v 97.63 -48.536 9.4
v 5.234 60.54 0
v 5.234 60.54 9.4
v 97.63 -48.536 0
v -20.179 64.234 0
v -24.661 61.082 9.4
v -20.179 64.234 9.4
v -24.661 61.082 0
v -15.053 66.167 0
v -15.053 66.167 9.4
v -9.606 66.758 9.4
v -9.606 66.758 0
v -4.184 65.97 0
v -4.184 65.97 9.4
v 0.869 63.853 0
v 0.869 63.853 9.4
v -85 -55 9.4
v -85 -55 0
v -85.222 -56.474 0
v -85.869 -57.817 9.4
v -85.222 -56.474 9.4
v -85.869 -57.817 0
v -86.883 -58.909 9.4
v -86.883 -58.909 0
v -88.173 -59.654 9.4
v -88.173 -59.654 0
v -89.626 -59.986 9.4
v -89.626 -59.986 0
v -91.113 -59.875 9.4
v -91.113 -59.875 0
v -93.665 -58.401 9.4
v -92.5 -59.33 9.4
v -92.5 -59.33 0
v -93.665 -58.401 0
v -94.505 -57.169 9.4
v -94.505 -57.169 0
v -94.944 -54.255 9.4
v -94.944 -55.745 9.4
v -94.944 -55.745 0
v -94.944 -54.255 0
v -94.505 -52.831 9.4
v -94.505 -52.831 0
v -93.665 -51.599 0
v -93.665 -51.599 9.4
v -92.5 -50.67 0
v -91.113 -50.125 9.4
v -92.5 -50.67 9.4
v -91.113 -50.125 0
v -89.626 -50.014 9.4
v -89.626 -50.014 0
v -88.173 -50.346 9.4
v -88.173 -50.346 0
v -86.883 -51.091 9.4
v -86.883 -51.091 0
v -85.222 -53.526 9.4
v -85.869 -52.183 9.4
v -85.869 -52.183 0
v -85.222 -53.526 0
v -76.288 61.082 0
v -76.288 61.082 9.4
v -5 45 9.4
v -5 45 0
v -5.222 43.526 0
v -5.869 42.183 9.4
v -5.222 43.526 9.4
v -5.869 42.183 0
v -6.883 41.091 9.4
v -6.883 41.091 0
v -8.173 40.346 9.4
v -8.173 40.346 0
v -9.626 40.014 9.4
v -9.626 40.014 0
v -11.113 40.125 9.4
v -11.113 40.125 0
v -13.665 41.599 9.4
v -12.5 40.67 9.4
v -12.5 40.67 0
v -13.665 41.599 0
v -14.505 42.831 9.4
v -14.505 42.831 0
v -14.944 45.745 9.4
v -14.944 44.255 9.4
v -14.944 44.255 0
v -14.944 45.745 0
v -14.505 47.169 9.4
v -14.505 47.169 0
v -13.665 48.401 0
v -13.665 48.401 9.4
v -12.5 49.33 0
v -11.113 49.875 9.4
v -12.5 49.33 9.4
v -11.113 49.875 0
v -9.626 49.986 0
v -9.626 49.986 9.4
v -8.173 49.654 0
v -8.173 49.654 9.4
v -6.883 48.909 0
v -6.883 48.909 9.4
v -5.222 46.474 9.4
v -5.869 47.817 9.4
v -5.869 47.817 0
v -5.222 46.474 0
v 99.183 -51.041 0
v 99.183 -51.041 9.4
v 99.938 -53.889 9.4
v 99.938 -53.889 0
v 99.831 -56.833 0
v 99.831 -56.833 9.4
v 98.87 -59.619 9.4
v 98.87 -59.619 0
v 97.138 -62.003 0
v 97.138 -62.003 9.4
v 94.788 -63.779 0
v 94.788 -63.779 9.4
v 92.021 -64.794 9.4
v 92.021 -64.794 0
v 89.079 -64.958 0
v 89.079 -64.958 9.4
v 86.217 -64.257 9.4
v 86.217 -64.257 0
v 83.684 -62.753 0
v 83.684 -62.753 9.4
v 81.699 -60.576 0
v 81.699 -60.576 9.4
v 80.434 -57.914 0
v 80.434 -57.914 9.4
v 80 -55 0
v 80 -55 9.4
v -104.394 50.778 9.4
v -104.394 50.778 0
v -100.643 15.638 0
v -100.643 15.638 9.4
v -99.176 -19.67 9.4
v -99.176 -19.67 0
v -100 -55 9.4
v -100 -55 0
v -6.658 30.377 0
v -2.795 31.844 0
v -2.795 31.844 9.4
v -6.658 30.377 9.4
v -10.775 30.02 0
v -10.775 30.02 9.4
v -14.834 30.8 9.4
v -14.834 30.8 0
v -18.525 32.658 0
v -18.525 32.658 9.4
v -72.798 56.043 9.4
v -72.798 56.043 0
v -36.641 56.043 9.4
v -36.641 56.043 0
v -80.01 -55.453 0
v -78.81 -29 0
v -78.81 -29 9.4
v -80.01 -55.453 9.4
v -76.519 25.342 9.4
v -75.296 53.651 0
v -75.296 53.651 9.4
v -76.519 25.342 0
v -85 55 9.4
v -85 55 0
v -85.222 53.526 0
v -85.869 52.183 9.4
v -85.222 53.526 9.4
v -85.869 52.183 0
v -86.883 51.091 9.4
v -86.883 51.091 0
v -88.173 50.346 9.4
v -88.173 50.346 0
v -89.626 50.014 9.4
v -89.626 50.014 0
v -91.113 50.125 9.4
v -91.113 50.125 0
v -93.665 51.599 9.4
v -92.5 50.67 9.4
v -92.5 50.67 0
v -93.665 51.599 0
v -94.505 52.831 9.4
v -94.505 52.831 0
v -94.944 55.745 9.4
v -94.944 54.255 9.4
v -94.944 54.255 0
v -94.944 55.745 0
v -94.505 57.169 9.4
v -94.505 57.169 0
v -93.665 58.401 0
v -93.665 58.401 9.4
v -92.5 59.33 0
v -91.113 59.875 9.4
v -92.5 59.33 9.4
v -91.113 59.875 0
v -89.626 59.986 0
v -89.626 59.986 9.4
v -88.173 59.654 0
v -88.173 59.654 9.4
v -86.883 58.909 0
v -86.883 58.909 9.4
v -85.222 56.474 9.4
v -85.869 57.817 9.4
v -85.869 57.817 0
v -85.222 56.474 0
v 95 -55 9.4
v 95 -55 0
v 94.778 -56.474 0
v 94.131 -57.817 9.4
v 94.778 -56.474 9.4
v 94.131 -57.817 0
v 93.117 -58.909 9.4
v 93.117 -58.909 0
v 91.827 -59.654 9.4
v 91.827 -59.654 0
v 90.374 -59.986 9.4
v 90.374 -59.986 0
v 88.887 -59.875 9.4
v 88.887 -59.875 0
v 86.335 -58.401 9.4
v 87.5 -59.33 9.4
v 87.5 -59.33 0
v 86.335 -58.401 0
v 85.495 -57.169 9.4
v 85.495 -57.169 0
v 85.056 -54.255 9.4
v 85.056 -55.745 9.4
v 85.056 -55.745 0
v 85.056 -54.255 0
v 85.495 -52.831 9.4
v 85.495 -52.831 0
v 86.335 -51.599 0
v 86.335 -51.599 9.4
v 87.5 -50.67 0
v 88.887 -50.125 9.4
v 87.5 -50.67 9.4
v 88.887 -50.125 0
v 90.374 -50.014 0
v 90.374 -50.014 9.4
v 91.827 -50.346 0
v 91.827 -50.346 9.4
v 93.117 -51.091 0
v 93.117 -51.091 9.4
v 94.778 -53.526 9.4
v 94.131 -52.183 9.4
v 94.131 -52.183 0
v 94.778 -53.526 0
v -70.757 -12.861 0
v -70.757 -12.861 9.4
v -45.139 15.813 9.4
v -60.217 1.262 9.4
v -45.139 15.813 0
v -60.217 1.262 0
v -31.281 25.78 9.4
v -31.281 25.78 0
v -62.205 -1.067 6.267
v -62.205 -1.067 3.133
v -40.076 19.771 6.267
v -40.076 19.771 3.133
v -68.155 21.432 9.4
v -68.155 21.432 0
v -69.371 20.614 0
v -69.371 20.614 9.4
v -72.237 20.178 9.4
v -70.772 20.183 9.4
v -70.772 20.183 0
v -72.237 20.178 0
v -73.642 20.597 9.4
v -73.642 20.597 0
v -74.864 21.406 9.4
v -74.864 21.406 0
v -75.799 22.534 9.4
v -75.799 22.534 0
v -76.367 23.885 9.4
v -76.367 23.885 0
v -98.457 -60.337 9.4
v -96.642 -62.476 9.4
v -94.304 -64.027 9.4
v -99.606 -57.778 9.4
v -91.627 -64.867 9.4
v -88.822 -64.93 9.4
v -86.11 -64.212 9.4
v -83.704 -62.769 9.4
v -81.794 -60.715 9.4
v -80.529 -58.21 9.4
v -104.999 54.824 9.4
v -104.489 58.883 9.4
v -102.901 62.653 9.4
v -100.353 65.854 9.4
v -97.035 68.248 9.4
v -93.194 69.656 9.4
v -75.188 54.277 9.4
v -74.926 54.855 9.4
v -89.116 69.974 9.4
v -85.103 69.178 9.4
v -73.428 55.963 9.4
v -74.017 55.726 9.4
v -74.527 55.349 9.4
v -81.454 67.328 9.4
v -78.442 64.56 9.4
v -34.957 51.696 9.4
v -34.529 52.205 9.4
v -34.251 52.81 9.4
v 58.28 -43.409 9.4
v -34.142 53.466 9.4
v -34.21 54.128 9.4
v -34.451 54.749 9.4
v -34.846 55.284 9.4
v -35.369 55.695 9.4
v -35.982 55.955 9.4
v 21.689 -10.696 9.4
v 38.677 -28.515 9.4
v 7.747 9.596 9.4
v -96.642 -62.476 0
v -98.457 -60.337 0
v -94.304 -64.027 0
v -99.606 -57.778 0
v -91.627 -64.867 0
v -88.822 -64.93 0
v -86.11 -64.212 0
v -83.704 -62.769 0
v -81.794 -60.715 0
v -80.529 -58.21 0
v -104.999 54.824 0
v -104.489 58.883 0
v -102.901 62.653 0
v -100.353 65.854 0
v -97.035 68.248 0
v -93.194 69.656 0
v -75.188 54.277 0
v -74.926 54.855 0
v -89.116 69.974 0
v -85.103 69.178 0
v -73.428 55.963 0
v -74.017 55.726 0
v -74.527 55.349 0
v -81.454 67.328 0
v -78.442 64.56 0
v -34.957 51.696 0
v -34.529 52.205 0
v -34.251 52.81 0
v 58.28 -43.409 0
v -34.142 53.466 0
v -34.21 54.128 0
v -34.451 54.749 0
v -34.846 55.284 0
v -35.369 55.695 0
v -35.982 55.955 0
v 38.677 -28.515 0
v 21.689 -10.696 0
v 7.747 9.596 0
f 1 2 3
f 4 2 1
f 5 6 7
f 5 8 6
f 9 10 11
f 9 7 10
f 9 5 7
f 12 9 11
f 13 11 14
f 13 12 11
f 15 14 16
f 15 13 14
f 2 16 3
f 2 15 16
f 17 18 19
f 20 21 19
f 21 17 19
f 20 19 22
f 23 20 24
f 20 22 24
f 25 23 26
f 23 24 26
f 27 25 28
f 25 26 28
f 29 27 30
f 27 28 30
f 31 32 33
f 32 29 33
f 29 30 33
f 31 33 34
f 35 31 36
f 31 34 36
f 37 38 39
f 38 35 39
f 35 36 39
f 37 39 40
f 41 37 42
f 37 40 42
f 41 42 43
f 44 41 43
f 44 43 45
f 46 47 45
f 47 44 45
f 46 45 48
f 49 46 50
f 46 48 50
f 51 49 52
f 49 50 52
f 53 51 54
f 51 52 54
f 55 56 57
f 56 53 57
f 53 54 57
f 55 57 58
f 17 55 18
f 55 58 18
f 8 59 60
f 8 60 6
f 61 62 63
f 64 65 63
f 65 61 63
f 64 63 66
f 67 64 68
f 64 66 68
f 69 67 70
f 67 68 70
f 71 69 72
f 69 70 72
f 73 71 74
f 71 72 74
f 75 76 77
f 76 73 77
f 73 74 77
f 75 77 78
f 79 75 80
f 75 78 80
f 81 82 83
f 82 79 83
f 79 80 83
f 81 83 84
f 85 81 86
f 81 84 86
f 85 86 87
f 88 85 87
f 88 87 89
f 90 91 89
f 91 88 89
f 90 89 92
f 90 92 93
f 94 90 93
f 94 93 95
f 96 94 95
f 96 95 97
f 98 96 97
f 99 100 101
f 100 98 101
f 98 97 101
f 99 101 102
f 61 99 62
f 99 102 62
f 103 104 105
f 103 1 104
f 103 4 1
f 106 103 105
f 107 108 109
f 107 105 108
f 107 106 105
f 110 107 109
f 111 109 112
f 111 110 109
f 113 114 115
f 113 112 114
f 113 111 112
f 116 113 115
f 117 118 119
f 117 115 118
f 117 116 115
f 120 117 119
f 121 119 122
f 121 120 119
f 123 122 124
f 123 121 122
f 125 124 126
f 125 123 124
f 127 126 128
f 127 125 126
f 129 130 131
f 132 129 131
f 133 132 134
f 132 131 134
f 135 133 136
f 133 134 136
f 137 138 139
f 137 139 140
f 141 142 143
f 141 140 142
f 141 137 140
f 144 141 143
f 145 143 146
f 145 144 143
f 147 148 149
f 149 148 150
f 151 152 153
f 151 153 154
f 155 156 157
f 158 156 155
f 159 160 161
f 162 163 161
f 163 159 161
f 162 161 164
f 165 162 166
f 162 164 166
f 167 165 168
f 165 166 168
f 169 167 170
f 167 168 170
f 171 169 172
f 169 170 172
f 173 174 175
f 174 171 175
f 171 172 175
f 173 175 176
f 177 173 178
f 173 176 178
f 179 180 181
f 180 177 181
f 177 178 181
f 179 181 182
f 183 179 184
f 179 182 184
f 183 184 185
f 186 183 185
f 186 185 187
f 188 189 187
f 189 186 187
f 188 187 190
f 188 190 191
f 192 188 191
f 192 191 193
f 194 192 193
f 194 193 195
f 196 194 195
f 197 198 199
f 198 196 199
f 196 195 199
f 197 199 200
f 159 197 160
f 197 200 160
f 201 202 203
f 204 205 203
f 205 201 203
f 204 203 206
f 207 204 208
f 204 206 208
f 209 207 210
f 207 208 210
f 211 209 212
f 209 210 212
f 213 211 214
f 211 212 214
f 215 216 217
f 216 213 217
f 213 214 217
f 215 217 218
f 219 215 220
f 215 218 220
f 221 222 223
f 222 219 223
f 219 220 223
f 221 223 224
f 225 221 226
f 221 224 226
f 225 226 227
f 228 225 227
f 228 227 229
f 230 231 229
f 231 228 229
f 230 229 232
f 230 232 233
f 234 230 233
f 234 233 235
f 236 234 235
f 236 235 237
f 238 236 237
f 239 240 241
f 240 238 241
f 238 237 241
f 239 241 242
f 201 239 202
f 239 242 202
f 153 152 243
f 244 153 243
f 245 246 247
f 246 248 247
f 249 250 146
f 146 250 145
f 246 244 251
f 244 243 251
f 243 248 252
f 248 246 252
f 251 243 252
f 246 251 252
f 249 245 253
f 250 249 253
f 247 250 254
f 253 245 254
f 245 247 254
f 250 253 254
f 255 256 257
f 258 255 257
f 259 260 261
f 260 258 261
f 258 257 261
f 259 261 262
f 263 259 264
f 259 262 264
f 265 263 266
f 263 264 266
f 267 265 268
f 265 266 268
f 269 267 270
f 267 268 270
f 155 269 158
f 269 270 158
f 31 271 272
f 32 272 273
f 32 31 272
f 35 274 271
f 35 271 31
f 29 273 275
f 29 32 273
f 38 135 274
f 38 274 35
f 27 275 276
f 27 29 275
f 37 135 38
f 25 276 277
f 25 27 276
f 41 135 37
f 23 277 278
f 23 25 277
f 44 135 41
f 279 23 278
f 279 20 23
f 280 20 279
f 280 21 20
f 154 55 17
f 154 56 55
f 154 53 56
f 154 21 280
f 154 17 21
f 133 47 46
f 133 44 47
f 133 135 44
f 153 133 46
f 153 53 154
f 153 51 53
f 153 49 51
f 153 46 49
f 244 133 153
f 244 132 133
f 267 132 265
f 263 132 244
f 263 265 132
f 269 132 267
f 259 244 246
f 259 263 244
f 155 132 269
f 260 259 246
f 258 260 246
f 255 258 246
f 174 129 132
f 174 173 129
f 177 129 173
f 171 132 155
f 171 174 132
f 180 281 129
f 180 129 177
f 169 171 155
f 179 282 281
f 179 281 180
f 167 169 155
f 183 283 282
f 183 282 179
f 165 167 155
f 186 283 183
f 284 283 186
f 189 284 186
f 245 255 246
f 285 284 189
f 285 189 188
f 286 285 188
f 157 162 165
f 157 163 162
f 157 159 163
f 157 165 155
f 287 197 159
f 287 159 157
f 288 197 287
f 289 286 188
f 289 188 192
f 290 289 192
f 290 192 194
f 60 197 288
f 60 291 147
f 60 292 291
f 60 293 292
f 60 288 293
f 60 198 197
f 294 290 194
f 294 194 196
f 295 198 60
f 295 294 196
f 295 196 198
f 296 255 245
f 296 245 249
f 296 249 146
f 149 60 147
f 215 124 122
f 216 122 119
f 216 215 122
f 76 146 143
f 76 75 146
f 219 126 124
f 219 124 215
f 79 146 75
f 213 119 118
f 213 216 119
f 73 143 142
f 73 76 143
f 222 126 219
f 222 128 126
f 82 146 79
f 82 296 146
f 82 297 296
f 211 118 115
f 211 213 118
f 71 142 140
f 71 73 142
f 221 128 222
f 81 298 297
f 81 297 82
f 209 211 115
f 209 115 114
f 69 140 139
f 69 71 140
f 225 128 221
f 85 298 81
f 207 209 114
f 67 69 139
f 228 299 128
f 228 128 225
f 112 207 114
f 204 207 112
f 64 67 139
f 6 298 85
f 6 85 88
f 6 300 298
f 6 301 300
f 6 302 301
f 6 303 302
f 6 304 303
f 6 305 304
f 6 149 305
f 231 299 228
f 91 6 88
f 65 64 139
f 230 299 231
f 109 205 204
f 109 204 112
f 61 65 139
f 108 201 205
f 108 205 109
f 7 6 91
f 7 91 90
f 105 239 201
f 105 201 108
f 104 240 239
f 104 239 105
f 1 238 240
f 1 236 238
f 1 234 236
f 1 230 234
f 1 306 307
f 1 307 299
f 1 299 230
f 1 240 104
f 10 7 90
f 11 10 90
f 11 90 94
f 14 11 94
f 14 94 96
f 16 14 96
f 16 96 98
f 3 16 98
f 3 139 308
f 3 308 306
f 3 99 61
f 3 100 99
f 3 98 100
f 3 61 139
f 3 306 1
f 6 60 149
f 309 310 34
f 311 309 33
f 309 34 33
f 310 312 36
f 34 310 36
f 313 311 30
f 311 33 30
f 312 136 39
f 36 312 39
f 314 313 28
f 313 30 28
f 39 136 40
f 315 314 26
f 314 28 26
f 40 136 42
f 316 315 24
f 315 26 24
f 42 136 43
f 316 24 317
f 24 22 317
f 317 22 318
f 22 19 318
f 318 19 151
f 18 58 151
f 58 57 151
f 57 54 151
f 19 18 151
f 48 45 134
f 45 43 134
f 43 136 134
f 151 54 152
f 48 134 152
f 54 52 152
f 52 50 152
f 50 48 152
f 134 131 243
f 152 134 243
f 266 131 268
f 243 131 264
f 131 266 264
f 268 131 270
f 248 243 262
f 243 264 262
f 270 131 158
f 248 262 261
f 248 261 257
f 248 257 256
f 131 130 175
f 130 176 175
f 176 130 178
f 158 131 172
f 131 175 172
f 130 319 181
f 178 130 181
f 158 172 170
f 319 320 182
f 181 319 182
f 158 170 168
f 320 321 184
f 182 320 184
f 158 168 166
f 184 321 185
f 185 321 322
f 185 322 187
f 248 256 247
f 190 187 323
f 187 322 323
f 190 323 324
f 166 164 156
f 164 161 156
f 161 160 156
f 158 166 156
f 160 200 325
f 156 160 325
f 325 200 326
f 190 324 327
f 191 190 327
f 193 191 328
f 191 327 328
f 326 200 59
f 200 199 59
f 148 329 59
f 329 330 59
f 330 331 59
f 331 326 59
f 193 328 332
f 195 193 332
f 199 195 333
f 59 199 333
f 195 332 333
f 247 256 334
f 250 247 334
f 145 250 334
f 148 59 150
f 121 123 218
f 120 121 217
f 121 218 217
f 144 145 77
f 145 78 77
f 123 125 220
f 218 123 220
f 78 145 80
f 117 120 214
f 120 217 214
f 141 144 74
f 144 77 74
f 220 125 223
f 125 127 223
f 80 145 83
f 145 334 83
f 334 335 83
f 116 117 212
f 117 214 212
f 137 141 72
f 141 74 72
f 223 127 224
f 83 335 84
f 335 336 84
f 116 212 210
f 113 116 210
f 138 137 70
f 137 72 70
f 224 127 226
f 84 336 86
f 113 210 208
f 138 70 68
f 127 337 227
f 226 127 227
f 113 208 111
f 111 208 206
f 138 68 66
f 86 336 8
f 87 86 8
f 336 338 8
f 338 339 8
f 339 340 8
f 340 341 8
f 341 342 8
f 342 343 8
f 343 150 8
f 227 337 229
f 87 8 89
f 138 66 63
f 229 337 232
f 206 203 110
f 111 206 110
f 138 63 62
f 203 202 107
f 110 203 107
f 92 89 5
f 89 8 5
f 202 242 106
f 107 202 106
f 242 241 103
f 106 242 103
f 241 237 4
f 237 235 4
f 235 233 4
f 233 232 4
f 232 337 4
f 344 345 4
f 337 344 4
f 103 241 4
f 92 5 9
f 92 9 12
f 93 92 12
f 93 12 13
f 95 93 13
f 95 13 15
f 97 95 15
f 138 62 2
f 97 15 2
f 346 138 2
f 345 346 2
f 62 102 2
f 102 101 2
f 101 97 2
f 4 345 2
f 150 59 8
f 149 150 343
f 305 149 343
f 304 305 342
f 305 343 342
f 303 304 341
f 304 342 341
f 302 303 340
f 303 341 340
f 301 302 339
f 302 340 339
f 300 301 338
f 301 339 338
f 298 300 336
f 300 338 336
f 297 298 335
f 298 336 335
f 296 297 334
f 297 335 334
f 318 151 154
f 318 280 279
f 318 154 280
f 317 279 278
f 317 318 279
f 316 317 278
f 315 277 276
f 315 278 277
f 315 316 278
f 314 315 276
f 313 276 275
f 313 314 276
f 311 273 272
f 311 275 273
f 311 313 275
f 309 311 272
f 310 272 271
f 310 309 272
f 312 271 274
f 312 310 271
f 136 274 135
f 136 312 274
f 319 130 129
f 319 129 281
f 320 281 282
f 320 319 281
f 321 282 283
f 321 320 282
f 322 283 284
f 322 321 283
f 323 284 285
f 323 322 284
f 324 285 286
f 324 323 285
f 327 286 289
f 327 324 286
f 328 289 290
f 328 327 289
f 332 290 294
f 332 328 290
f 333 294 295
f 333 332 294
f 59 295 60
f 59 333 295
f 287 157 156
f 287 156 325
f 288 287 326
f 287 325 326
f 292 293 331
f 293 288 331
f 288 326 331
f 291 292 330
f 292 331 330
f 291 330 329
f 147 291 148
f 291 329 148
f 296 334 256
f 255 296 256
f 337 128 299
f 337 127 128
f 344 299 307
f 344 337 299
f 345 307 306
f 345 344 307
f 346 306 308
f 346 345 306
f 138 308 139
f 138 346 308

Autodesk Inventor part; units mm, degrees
ref_plane "YZ Plane" through (0, 0, 0) normal (1, 0, 0) x (0, 1, 0)
ref_plane "XZ Plane" through (0, 0, 0) normal (0, 1, 0) x (-1, 0, 0)
ref_plane "XY Plane" through (0, 0, 0) normal (0, 0, 1) x (1, 0, 0)
sketch "Sketch1" plane through (0, 0, 0) normal (0, 0, 1) x (1, 0, 0)
  line L0 (-110, 70) -> (110, 70) construction
  line L1 (110, 70) -> (110, -70) construction
  line L2 (110, -70) -> (-110, -70) construction
  line L3 (-110, -70) -> (-110, 70) construction
  circle A0 centre (-90, 55) radius 5
  circle A1 centre (-90, -55) radius 5
  circle A2 centre (90, -55) radius 5
  circle A3 centre (-10, 45) radius 5
  line L4 (-67, 0) -> (-42, 0) construction
  line L5 (-42, 0) -> (-42, -30) construction
  line L6 (-42, -30) -> (-67, -30) construction
  line L7 (-67, -30) -> (-67, 0) construction
  circle A4 centre (-54.5, -19) radius 10 construction
  arc A5 (-76.2883, 61.082) -> (-104.3936, 50.7781) centre (-90, 55) ccw
  arc A6 (-99.9402, -53.9078) -> (-80.0103, -55.4531) centre (-90, -55) ccw
  arc A7 (-100, -55) -> (-105, 55) centre (-644.4063, -24.6321) ccw
  line L8 (-78.8103, -29) -> (-67, 2.1947) construction
  line L9 (-67, 2.1947) -> (-37.7539, 24.0313) construction
  line L10 (-37.7539, 24.0313) -> (-18.5252, 32.6582) construction
  spline S0 degree 3 poles (-78.8103, -29) (-67, 2.1947) (-37.7539, 24.0313) (-18.5252, 32.6582) knots 1 1 1 1 2 2 2 2
  line L11 (-34.9568, 51.6958) -> (-68.1552, 21.4315)
  line L12 (-75.2957, 53.6513) -> (-76.519, 25.3424)
  line L13 (-78.8103, -29) -> (-80.0103, -55.4531)
  arc A8 (80, -55) -> (97.6304, -48.5365) centre (90, -55) ccw
  line L14 (5.2335, 60.5405) -> (97.6304, -48.5365)
  arc A9 (-2.7947, 31.8439) -> (80, -55) centre (141.6446, 86.6595) ccw
  arc A10 (-18.5252, 32.6582) -> (-2.7947, 31.8439) centre (-10, 45) ccw
  arc A11 (5.2335, 60.5405) -> (-24.6607, 61.082) centre (-10, 45) ccw
  arc A12 (-76.519, 25.3424) -> (-68.1552, 21.4315) centre (-71.5236, 25.1265) ccw
  line L15 (-76.2883, 61.082) -> (-24.6607, 61.082)
  line L16 (-72.7981, 56.0433) -> (-36.641, 56.0433)
  arc A13 (-72.7981, 56.0433) -> (-75.2957, 53.6513) centre (-72.7981, 53.5433) ccw
  arc A14 (-34.9568, 51.6958) -> (-36.641, 56.0433) centre (-36.641, 53.5433) ccw
  point P0 (0, 0)
  dimension "d1" = 70
  dimension "d2" = 70
  dimension "d3" = 110
  dimension "d4" = 110
  dimension "d5" = 10
  dimension "d6" = 10
  dimension "d7" = 10
  dimension "d8" = 10
  dimension "d9" = 55
  dimension "d10" = 55
  dimension "d11" = 55
  dimension "d12" = 180
  dimension "d13" = 90
  dimension "d15" = 10
  dimension "d16" = 45
  dimension "d17" = 42
  dimension "d18" = 30
  dimension "d19" = 0
  dimension "d20" = 25
  dimension "d21" = 20
  dimension "d25" = 19
  dimension "d26" = 12.5
  dimension "d67" = 90
  dimension "d68" = 30
  dimension "d70" = 20
  dimension "d71" = 20
  dimension "d74" = 10
  dimension "d75" = 5
  dimension "d76" = 5
extrude "Extrusion6" add sketch "Sketch1" along normal blind 9.4 contours L15 A11 L14 A8 A9 A10 S0 L13 A6 A7 A5 | A7 A5
equation "\"d1\" = d2"
equation "\"d4\" = d3"
equation "\"d10\" = d9"
equation "\"d11\" = d9"
equation "\"d26\" = 0.5 * d20"
properties part number "Bracket Concept MK9"
